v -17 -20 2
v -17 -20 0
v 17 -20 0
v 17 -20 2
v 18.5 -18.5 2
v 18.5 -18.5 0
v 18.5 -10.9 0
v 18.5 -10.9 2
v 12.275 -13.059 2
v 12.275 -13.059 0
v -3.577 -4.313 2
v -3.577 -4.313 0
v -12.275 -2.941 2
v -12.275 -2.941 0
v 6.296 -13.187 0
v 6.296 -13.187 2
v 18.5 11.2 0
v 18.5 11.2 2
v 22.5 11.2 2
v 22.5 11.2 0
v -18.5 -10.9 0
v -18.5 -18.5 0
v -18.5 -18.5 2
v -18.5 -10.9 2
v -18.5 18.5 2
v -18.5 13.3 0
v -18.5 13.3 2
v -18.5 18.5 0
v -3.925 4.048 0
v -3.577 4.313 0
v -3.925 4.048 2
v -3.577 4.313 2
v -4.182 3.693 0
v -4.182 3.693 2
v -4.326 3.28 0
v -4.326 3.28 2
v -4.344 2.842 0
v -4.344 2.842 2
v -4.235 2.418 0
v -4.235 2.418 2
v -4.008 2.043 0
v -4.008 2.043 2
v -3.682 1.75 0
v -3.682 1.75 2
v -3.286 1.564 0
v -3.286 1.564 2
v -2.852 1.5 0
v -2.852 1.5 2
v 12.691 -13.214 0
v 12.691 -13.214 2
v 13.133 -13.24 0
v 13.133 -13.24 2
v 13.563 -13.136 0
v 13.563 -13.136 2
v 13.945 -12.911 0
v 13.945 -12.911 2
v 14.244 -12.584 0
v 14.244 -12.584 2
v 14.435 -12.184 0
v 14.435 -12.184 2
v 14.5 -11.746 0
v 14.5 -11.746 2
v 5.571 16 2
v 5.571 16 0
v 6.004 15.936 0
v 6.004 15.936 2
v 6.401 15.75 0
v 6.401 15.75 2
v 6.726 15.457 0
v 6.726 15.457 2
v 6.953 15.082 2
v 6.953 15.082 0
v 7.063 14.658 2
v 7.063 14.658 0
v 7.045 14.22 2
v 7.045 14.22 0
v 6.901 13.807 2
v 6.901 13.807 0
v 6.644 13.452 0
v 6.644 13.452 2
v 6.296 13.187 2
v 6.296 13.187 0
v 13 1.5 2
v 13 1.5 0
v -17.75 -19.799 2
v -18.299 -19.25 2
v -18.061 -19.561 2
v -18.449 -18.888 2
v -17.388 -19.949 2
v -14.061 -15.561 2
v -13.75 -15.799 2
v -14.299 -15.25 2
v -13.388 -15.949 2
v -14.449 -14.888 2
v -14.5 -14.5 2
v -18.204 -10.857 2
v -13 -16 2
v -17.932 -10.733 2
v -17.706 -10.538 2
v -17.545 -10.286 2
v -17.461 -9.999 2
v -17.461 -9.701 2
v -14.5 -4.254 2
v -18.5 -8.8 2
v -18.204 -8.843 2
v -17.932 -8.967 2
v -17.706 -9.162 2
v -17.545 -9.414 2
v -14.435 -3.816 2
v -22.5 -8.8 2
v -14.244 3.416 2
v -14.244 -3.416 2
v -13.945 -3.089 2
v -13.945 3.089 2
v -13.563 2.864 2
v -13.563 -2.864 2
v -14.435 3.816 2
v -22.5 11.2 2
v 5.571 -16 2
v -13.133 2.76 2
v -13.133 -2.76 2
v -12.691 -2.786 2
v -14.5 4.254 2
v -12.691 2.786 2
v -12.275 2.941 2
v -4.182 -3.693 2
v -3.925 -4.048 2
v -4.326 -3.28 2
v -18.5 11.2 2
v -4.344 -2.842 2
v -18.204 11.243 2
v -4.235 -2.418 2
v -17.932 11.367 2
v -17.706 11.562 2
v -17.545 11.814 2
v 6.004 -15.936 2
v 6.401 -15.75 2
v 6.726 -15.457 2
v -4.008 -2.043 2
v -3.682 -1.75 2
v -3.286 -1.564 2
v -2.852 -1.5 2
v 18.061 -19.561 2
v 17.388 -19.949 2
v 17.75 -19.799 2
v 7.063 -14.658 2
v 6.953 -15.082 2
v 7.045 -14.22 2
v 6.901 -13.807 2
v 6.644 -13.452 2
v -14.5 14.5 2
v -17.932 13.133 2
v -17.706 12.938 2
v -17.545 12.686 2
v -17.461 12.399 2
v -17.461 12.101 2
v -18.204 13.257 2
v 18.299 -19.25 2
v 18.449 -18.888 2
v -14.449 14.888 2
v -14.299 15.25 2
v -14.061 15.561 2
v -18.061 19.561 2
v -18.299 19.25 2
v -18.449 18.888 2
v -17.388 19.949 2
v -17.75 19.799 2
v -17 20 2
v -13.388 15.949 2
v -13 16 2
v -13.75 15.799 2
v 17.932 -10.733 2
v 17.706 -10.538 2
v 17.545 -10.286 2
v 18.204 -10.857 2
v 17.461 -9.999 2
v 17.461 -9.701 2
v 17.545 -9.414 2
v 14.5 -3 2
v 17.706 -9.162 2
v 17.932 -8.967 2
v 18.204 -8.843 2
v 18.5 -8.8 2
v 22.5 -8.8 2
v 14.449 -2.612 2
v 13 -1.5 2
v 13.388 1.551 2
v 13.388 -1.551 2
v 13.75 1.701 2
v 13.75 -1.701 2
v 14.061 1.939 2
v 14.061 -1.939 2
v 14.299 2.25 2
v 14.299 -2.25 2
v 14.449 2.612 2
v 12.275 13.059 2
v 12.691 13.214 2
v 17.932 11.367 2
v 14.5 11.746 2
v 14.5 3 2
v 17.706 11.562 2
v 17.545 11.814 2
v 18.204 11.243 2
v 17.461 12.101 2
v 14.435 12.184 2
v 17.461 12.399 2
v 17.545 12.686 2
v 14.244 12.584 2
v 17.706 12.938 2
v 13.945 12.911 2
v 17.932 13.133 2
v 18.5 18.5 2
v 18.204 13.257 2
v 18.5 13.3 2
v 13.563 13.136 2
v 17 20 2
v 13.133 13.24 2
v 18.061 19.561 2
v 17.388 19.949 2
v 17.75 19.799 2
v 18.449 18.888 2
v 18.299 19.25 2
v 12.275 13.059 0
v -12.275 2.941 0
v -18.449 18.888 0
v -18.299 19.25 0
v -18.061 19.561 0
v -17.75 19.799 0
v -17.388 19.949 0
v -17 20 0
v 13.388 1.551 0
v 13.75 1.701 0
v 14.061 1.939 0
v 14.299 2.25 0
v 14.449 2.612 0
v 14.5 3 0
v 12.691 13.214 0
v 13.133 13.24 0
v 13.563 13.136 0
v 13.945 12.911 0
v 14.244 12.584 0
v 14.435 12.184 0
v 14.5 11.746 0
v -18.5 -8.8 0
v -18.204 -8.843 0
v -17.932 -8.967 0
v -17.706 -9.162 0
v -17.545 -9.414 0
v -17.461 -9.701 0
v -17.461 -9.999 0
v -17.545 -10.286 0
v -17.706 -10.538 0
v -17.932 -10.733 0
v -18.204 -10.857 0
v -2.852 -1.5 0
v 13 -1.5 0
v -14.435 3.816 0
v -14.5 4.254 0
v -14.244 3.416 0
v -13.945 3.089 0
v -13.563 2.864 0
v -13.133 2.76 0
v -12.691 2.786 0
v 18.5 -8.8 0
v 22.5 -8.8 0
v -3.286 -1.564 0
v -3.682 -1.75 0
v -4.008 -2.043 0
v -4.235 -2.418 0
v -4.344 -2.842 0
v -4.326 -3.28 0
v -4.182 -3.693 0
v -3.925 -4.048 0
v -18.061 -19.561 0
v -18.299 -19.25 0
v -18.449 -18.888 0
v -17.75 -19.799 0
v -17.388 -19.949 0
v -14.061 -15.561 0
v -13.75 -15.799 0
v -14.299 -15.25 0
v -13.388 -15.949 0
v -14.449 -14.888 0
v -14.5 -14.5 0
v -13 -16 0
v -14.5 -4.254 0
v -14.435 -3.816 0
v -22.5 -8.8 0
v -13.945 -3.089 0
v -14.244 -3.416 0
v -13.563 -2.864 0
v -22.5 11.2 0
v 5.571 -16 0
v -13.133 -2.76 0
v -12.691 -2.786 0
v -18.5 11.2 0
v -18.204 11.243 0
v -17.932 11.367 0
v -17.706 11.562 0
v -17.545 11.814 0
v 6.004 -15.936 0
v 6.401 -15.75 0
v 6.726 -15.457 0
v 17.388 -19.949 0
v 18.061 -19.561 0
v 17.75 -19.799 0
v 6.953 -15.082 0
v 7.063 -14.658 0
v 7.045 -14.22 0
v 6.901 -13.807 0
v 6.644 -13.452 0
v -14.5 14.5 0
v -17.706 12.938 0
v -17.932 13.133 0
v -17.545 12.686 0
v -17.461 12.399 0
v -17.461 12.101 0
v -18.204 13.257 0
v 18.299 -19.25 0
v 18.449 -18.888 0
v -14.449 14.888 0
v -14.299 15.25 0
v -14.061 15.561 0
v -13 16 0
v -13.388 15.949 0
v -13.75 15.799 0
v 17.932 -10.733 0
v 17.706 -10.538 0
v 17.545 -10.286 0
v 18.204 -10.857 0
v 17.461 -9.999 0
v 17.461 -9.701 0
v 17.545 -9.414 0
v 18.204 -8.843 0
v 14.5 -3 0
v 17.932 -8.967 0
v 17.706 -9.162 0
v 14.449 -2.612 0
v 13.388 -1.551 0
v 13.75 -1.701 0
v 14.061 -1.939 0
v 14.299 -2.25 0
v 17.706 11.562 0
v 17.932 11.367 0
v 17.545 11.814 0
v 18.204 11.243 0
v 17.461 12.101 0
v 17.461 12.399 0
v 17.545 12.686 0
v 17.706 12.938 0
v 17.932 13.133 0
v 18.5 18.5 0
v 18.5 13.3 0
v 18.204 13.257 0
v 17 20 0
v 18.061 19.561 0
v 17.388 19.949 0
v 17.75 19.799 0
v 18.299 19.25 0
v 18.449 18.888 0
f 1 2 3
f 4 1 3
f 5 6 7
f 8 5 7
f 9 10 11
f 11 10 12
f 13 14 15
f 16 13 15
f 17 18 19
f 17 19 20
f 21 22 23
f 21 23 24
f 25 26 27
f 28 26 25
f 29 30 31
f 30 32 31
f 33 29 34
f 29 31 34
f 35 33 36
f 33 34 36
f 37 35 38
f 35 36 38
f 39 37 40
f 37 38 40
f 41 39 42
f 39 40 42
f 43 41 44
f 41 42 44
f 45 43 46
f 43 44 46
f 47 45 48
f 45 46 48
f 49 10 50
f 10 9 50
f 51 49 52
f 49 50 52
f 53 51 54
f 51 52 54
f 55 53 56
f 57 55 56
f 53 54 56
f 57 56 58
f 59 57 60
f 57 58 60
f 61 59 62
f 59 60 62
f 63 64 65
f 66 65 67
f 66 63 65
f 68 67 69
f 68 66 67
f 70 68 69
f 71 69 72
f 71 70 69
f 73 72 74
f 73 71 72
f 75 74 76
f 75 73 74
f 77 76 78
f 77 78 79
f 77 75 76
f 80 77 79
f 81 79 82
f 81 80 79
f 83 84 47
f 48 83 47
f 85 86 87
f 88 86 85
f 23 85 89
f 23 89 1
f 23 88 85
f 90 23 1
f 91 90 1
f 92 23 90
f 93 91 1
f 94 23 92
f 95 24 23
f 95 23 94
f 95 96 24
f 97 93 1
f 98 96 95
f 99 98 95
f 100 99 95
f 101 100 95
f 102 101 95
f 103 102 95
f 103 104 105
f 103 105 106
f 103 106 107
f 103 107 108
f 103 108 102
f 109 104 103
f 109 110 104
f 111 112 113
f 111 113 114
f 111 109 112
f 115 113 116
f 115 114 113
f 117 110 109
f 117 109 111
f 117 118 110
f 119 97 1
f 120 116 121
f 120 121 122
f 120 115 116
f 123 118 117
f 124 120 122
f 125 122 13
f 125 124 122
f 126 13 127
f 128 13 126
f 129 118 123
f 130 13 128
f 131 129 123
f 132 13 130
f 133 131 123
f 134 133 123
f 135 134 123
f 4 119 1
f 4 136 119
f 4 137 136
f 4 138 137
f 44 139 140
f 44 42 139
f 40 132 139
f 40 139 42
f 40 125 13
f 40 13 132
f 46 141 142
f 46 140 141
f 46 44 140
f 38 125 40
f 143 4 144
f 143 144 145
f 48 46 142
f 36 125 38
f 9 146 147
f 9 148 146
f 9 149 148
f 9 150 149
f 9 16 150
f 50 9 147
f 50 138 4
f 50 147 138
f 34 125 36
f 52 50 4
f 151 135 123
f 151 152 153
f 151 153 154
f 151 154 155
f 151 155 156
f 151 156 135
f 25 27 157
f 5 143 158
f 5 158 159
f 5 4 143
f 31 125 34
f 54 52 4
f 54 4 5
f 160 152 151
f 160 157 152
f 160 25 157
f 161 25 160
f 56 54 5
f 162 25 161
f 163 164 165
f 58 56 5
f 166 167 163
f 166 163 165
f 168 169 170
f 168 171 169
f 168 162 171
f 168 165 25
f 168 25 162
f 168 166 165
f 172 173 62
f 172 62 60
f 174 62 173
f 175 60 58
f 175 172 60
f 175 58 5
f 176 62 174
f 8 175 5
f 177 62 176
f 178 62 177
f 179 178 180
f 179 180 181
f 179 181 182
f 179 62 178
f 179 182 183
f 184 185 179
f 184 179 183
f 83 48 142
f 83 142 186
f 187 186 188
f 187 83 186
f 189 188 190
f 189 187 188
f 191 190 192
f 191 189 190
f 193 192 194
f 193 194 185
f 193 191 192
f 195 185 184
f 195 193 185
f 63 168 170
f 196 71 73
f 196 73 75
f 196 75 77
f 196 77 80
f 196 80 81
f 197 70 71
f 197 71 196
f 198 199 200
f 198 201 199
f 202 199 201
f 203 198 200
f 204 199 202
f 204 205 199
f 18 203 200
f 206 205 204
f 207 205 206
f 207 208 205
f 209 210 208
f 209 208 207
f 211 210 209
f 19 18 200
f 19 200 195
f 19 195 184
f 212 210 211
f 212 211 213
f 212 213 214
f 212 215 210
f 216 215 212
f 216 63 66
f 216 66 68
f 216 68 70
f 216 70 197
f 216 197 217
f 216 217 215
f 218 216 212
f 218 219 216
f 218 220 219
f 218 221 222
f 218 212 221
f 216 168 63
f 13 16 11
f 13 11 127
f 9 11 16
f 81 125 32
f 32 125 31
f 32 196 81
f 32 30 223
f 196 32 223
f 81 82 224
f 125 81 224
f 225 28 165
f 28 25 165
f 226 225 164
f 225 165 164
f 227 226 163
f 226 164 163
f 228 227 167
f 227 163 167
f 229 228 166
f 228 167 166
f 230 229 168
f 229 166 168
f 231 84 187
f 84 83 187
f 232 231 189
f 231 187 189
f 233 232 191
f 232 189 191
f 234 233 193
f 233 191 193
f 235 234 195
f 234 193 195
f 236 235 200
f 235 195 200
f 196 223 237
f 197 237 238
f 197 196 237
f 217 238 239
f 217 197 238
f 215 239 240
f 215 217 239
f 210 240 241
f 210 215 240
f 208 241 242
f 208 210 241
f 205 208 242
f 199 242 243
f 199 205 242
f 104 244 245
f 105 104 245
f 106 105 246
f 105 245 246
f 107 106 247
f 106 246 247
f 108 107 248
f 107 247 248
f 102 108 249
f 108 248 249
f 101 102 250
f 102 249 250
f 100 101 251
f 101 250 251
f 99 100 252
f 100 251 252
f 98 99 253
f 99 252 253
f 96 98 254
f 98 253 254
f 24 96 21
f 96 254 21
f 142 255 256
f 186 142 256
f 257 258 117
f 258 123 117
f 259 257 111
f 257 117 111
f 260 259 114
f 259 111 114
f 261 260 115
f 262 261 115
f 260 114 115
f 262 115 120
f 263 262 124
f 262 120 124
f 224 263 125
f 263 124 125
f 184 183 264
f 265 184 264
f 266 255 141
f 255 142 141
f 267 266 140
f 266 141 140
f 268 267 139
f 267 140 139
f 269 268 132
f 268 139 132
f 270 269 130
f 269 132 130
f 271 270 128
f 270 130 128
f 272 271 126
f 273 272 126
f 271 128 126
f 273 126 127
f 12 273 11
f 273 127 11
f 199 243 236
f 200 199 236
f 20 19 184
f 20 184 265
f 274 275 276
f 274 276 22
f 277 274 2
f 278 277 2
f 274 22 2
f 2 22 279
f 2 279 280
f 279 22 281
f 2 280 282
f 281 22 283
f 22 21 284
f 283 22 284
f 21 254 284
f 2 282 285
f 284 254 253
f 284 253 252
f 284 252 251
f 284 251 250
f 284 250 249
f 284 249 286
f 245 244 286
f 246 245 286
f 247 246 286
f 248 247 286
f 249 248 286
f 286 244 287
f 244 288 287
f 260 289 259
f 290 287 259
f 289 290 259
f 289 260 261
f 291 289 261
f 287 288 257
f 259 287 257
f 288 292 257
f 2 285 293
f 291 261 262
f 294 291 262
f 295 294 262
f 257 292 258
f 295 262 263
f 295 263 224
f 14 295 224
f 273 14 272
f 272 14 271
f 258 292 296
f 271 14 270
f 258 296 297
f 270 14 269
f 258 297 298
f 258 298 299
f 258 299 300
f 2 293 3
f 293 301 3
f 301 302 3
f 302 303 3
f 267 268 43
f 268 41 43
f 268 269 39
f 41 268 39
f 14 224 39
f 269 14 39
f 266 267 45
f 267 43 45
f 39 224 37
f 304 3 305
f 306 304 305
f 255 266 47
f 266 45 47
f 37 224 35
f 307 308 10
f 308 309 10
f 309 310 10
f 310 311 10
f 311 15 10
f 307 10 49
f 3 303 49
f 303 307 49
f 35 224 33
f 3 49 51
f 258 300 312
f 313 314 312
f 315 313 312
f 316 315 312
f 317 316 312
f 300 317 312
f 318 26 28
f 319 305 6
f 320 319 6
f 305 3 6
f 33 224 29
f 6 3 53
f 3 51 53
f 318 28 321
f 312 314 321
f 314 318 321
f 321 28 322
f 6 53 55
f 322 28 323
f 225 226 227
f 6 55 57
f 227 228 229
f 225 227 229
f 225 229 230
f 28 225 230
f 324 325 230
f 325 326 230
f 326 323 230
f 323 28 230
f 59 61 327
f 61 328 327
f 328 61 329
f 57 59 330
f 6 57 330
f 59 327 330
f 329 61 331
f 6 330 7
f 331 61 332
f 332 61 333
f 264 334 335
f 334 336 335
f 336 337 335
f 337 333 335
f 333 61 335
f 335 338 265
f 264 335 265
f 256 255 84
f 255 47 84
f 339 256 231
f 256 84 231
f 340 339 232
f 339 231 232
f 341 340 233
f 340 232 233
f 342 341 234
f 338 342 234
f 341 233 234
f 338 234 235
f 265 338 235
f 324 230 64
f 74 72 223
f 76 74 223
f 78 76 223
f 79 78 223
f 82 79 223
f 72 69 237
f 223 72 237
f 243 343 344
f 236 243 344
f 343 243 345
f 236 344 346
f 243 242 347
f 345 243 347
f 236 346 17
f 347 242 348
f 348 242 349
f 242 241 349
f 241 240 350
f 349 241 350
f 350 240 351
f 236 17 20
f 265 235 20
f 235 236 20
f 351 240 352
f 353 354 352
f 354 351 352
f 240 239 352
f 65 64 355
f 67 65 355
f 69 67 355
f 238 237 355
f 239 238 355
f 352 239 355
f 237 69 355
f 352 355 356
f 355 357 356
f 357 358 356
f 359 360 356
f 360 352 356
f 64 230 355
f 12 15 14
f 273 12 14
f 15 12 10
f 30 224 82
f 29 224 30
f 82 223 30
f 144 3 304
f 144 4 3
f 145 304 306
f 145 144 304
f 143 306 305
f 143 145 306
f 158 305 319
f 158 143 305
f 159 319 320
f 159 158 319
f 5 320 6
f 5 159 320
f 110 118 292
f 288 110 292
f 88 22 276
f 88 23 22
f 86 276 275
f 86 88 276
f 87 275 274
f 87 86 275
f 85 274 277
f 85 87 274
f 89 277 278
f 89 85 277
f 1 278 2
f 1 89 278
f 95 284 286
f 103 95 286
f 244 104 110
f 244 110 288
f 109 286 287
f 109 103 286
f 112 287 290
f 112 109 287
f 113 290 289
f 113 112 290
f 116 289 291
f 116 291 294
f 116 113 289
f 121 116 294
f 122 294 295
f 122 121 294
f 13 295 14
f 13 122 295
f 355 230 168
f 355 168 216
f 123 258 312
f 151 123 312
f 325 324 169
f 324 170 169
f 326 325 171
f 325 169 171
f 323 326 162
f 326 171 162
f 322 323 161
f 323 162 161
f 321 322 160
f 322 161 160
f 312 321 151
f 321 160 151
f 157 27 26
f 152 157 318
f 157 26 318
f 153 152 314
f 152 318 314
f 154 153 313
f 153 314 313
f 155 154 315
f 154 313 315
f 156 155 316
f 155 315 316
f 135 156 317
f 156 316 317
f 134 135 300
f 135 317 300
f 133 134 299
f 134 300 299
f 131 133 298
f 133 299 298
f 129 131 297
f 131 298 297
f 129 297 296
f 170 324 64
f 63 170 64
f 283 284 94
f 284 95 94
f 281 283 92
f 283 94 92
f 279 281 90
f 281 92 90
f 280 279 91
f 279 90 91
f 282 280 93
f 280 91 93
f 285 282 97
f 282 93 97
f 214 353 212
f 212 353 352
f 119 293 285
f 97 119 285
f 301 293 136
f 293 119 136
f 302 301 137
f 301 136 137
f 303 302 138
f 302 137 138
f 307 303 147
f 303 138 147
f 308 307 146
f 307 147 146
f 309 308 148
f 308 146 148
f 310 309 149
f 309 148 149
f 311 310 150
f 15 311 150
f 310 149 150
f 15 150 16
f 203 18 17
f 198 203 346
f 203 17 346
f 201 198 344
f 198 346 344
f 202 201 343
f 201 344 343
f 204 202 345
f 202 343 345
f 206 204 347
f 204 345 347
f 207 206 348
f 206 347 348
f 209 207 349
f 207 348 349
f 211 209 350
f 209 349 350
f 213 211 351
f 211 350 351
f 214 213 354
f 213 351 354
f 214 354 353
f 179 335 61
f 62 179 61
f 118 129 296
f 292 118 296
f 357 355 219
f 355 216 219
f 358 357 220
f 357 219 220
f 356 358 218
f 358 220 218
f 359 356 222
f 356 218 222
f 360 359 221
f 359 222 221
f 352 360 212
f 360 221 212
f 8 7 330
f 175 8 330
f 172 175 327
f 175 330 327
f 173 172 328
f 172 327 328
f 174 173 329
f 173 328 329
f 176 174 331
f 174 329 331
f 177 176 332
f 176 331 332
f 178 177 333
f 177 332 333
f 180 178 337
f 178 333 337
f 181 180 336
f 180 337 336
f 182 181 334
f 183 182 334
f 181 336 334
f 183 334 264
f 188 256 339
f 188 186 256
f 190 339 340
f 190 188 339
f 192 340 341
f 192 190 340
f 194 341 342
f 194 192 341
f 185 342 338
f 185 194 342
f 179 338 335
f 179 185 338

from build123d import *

# Parameters (mm, degrees)
SKETCH_1_W          = 37
SKETCH_1_H          = 40
EXTRUDE_1_DEPTH     = 2
SKETCH_2_W          = 2
SKETCH_2_H          = 20
EXTRUDE_2_DEPTH     = 4
SKETCH_3_R          = 1.05
CUT_EXTRUDE_1_DEPTH = 3
CUT_EXTRUDE_2_DEPTH = 10
FILLET_1_R          = 1.5


with BuildPart() as part:
    # 草图1 → 凸台-拉伸1 (new body)
    with BuildSketch(Plane.XY):
        Rectangle(SKETCH_1_W, SKETCH_1_H)
    extrude(amount=EXTRUDE_1_DEPTH)

    # 草图2 → 凸台-拉伸2 (add)
    with BuildSketch(Plane(origin=(18.5, 0, 0), x_dir=(0, 0, -1), z_dir=(1, 0, 0))):
        with Locations((-1, 1.2)):
            Rectangle(SKETCH_2_W, SKETCH_2_H)
    extrude_2 = extrude(amount=EXTRUDE_2_DEPTH)

    # 镜向1: 凸台-拉伸2 across plane
    add(extrude_2.mirror(Plane(origin=(0, 0, 0), x_dir=(0, 0, 1), z_dir=(1, 0, 0))))

    # 草图3 → 切除-拉伸1 (cut)
    with BuildSketch(Plane(origin=(0, 0, 0), x_dir=(-1, 0, 0), z_dir=(0, 0, -1))):
        with Locations((18.5, 12.25)):
            Circle(SKETCH_3_R)
        with Locations((18.5, -9.85)):
            Circle(SKETCH_3_R)
        with Locations((-18.5, -9.85)):
            Circle(SKETCH_3_R)
        with Locations((-18.5, 12.25)):
            Circle(SKETCH_3_R)
    extrude(amount=-CUT_EXTRUDE_1_DEPTH, mode=Mode.SUBTRACT)

    # 草图4 → 切除-拉伸2 (cut)
    with BuildSketch(Plane(origin=(0, 0, 0), x_dir=(-1, 0, 0), z_dir=(0, 0, -1))):
        Polygon((14.5, -1.713154672), (-11.394907157, -16), (14.5, -16), align=None)
        Polygon((-14.5, -1.5), (-14.5, -14.286845328), (8.676157157, -1.5), align=None)
        Polygon((-14.5, 14.286845328), (-14.5, 1.5), (8.676157157, 1.5), align=None)
        Polygon((-11.394907157, 16), (14.5, 1.713154672), (14.5, 16), align=None)
    extrude(amount=-CUT_EXTRUDE_2_DEPTH, mode=Mode.SUBTRACT)

    # 圆角1
    fillet_1_edges = [part.edges().sort_by_distance(p)[0] for p in [
        (11.394907157, 16, 1),
        (-14.5, 16, 1),
        (-14.5, 1.713154672, 1),
        (-14.5, -1.713154672, 1),
        (-14.5, -16, 1),
        (11.394907157, -16, 1),
        (18.5, -20, 1),
        (-18.5, -20, 1),
        (-18.5, 20, 1),
        (18.5, 20, 1),
        (14.5, -1.5, 1),
        (-8.676157157, -1.5, 1),
        (14.5, -14.286845328, 1),
        (14.5, 1.5, 1),
        (14.5, 14.286845328, 1),
        (-8.676157157, 1.5, 1),
    ]]
    fillet(fillet_1_edges, radius=FILLET_1_R)


solid = part.part
